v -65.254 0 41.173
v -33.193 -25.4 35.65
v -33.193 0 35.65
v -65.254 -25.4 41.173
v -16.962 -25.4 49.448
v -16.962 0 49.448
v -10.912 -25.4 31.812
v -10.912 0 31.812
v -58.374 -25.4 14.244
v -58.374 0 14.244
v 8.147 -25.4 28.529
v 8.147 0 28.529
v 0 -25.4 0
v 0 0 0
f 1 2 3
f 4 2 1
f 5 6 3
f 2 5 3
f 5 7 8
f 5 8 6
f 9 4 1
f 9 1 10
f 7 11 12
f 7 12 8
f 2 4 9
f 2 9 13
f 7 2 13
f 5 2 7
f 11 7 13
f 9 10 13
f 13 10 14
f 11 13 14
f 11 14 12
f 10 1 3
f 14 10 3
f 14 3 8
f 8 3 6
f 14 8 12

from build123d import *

# Parameters (mm, degrees)
F1_DEPTH = 25.4
F3_DEPTH = 25.4


with BuildPart() as f1:
    # F0 (on Front) → F1 (new body)
    with BuildSketch(Plane.XZ):
        Polygon((-58.37366, 14.244376), (0, 0), (-16.961619, 49.44808), align=None)
    extrude(amount=F1_DEPTH)

    # F2 (on face) → F3 (join)
    with BuildSketch(Plane.XZ.offset(25.4)):
        Polygon((8.147058, 28.529268), (-65.254316, 41.173346), (-58.37366, 14.244376), (0, 0), align=None)
    extrude(amount=-F3_DEPTH)


solid = f1.part
